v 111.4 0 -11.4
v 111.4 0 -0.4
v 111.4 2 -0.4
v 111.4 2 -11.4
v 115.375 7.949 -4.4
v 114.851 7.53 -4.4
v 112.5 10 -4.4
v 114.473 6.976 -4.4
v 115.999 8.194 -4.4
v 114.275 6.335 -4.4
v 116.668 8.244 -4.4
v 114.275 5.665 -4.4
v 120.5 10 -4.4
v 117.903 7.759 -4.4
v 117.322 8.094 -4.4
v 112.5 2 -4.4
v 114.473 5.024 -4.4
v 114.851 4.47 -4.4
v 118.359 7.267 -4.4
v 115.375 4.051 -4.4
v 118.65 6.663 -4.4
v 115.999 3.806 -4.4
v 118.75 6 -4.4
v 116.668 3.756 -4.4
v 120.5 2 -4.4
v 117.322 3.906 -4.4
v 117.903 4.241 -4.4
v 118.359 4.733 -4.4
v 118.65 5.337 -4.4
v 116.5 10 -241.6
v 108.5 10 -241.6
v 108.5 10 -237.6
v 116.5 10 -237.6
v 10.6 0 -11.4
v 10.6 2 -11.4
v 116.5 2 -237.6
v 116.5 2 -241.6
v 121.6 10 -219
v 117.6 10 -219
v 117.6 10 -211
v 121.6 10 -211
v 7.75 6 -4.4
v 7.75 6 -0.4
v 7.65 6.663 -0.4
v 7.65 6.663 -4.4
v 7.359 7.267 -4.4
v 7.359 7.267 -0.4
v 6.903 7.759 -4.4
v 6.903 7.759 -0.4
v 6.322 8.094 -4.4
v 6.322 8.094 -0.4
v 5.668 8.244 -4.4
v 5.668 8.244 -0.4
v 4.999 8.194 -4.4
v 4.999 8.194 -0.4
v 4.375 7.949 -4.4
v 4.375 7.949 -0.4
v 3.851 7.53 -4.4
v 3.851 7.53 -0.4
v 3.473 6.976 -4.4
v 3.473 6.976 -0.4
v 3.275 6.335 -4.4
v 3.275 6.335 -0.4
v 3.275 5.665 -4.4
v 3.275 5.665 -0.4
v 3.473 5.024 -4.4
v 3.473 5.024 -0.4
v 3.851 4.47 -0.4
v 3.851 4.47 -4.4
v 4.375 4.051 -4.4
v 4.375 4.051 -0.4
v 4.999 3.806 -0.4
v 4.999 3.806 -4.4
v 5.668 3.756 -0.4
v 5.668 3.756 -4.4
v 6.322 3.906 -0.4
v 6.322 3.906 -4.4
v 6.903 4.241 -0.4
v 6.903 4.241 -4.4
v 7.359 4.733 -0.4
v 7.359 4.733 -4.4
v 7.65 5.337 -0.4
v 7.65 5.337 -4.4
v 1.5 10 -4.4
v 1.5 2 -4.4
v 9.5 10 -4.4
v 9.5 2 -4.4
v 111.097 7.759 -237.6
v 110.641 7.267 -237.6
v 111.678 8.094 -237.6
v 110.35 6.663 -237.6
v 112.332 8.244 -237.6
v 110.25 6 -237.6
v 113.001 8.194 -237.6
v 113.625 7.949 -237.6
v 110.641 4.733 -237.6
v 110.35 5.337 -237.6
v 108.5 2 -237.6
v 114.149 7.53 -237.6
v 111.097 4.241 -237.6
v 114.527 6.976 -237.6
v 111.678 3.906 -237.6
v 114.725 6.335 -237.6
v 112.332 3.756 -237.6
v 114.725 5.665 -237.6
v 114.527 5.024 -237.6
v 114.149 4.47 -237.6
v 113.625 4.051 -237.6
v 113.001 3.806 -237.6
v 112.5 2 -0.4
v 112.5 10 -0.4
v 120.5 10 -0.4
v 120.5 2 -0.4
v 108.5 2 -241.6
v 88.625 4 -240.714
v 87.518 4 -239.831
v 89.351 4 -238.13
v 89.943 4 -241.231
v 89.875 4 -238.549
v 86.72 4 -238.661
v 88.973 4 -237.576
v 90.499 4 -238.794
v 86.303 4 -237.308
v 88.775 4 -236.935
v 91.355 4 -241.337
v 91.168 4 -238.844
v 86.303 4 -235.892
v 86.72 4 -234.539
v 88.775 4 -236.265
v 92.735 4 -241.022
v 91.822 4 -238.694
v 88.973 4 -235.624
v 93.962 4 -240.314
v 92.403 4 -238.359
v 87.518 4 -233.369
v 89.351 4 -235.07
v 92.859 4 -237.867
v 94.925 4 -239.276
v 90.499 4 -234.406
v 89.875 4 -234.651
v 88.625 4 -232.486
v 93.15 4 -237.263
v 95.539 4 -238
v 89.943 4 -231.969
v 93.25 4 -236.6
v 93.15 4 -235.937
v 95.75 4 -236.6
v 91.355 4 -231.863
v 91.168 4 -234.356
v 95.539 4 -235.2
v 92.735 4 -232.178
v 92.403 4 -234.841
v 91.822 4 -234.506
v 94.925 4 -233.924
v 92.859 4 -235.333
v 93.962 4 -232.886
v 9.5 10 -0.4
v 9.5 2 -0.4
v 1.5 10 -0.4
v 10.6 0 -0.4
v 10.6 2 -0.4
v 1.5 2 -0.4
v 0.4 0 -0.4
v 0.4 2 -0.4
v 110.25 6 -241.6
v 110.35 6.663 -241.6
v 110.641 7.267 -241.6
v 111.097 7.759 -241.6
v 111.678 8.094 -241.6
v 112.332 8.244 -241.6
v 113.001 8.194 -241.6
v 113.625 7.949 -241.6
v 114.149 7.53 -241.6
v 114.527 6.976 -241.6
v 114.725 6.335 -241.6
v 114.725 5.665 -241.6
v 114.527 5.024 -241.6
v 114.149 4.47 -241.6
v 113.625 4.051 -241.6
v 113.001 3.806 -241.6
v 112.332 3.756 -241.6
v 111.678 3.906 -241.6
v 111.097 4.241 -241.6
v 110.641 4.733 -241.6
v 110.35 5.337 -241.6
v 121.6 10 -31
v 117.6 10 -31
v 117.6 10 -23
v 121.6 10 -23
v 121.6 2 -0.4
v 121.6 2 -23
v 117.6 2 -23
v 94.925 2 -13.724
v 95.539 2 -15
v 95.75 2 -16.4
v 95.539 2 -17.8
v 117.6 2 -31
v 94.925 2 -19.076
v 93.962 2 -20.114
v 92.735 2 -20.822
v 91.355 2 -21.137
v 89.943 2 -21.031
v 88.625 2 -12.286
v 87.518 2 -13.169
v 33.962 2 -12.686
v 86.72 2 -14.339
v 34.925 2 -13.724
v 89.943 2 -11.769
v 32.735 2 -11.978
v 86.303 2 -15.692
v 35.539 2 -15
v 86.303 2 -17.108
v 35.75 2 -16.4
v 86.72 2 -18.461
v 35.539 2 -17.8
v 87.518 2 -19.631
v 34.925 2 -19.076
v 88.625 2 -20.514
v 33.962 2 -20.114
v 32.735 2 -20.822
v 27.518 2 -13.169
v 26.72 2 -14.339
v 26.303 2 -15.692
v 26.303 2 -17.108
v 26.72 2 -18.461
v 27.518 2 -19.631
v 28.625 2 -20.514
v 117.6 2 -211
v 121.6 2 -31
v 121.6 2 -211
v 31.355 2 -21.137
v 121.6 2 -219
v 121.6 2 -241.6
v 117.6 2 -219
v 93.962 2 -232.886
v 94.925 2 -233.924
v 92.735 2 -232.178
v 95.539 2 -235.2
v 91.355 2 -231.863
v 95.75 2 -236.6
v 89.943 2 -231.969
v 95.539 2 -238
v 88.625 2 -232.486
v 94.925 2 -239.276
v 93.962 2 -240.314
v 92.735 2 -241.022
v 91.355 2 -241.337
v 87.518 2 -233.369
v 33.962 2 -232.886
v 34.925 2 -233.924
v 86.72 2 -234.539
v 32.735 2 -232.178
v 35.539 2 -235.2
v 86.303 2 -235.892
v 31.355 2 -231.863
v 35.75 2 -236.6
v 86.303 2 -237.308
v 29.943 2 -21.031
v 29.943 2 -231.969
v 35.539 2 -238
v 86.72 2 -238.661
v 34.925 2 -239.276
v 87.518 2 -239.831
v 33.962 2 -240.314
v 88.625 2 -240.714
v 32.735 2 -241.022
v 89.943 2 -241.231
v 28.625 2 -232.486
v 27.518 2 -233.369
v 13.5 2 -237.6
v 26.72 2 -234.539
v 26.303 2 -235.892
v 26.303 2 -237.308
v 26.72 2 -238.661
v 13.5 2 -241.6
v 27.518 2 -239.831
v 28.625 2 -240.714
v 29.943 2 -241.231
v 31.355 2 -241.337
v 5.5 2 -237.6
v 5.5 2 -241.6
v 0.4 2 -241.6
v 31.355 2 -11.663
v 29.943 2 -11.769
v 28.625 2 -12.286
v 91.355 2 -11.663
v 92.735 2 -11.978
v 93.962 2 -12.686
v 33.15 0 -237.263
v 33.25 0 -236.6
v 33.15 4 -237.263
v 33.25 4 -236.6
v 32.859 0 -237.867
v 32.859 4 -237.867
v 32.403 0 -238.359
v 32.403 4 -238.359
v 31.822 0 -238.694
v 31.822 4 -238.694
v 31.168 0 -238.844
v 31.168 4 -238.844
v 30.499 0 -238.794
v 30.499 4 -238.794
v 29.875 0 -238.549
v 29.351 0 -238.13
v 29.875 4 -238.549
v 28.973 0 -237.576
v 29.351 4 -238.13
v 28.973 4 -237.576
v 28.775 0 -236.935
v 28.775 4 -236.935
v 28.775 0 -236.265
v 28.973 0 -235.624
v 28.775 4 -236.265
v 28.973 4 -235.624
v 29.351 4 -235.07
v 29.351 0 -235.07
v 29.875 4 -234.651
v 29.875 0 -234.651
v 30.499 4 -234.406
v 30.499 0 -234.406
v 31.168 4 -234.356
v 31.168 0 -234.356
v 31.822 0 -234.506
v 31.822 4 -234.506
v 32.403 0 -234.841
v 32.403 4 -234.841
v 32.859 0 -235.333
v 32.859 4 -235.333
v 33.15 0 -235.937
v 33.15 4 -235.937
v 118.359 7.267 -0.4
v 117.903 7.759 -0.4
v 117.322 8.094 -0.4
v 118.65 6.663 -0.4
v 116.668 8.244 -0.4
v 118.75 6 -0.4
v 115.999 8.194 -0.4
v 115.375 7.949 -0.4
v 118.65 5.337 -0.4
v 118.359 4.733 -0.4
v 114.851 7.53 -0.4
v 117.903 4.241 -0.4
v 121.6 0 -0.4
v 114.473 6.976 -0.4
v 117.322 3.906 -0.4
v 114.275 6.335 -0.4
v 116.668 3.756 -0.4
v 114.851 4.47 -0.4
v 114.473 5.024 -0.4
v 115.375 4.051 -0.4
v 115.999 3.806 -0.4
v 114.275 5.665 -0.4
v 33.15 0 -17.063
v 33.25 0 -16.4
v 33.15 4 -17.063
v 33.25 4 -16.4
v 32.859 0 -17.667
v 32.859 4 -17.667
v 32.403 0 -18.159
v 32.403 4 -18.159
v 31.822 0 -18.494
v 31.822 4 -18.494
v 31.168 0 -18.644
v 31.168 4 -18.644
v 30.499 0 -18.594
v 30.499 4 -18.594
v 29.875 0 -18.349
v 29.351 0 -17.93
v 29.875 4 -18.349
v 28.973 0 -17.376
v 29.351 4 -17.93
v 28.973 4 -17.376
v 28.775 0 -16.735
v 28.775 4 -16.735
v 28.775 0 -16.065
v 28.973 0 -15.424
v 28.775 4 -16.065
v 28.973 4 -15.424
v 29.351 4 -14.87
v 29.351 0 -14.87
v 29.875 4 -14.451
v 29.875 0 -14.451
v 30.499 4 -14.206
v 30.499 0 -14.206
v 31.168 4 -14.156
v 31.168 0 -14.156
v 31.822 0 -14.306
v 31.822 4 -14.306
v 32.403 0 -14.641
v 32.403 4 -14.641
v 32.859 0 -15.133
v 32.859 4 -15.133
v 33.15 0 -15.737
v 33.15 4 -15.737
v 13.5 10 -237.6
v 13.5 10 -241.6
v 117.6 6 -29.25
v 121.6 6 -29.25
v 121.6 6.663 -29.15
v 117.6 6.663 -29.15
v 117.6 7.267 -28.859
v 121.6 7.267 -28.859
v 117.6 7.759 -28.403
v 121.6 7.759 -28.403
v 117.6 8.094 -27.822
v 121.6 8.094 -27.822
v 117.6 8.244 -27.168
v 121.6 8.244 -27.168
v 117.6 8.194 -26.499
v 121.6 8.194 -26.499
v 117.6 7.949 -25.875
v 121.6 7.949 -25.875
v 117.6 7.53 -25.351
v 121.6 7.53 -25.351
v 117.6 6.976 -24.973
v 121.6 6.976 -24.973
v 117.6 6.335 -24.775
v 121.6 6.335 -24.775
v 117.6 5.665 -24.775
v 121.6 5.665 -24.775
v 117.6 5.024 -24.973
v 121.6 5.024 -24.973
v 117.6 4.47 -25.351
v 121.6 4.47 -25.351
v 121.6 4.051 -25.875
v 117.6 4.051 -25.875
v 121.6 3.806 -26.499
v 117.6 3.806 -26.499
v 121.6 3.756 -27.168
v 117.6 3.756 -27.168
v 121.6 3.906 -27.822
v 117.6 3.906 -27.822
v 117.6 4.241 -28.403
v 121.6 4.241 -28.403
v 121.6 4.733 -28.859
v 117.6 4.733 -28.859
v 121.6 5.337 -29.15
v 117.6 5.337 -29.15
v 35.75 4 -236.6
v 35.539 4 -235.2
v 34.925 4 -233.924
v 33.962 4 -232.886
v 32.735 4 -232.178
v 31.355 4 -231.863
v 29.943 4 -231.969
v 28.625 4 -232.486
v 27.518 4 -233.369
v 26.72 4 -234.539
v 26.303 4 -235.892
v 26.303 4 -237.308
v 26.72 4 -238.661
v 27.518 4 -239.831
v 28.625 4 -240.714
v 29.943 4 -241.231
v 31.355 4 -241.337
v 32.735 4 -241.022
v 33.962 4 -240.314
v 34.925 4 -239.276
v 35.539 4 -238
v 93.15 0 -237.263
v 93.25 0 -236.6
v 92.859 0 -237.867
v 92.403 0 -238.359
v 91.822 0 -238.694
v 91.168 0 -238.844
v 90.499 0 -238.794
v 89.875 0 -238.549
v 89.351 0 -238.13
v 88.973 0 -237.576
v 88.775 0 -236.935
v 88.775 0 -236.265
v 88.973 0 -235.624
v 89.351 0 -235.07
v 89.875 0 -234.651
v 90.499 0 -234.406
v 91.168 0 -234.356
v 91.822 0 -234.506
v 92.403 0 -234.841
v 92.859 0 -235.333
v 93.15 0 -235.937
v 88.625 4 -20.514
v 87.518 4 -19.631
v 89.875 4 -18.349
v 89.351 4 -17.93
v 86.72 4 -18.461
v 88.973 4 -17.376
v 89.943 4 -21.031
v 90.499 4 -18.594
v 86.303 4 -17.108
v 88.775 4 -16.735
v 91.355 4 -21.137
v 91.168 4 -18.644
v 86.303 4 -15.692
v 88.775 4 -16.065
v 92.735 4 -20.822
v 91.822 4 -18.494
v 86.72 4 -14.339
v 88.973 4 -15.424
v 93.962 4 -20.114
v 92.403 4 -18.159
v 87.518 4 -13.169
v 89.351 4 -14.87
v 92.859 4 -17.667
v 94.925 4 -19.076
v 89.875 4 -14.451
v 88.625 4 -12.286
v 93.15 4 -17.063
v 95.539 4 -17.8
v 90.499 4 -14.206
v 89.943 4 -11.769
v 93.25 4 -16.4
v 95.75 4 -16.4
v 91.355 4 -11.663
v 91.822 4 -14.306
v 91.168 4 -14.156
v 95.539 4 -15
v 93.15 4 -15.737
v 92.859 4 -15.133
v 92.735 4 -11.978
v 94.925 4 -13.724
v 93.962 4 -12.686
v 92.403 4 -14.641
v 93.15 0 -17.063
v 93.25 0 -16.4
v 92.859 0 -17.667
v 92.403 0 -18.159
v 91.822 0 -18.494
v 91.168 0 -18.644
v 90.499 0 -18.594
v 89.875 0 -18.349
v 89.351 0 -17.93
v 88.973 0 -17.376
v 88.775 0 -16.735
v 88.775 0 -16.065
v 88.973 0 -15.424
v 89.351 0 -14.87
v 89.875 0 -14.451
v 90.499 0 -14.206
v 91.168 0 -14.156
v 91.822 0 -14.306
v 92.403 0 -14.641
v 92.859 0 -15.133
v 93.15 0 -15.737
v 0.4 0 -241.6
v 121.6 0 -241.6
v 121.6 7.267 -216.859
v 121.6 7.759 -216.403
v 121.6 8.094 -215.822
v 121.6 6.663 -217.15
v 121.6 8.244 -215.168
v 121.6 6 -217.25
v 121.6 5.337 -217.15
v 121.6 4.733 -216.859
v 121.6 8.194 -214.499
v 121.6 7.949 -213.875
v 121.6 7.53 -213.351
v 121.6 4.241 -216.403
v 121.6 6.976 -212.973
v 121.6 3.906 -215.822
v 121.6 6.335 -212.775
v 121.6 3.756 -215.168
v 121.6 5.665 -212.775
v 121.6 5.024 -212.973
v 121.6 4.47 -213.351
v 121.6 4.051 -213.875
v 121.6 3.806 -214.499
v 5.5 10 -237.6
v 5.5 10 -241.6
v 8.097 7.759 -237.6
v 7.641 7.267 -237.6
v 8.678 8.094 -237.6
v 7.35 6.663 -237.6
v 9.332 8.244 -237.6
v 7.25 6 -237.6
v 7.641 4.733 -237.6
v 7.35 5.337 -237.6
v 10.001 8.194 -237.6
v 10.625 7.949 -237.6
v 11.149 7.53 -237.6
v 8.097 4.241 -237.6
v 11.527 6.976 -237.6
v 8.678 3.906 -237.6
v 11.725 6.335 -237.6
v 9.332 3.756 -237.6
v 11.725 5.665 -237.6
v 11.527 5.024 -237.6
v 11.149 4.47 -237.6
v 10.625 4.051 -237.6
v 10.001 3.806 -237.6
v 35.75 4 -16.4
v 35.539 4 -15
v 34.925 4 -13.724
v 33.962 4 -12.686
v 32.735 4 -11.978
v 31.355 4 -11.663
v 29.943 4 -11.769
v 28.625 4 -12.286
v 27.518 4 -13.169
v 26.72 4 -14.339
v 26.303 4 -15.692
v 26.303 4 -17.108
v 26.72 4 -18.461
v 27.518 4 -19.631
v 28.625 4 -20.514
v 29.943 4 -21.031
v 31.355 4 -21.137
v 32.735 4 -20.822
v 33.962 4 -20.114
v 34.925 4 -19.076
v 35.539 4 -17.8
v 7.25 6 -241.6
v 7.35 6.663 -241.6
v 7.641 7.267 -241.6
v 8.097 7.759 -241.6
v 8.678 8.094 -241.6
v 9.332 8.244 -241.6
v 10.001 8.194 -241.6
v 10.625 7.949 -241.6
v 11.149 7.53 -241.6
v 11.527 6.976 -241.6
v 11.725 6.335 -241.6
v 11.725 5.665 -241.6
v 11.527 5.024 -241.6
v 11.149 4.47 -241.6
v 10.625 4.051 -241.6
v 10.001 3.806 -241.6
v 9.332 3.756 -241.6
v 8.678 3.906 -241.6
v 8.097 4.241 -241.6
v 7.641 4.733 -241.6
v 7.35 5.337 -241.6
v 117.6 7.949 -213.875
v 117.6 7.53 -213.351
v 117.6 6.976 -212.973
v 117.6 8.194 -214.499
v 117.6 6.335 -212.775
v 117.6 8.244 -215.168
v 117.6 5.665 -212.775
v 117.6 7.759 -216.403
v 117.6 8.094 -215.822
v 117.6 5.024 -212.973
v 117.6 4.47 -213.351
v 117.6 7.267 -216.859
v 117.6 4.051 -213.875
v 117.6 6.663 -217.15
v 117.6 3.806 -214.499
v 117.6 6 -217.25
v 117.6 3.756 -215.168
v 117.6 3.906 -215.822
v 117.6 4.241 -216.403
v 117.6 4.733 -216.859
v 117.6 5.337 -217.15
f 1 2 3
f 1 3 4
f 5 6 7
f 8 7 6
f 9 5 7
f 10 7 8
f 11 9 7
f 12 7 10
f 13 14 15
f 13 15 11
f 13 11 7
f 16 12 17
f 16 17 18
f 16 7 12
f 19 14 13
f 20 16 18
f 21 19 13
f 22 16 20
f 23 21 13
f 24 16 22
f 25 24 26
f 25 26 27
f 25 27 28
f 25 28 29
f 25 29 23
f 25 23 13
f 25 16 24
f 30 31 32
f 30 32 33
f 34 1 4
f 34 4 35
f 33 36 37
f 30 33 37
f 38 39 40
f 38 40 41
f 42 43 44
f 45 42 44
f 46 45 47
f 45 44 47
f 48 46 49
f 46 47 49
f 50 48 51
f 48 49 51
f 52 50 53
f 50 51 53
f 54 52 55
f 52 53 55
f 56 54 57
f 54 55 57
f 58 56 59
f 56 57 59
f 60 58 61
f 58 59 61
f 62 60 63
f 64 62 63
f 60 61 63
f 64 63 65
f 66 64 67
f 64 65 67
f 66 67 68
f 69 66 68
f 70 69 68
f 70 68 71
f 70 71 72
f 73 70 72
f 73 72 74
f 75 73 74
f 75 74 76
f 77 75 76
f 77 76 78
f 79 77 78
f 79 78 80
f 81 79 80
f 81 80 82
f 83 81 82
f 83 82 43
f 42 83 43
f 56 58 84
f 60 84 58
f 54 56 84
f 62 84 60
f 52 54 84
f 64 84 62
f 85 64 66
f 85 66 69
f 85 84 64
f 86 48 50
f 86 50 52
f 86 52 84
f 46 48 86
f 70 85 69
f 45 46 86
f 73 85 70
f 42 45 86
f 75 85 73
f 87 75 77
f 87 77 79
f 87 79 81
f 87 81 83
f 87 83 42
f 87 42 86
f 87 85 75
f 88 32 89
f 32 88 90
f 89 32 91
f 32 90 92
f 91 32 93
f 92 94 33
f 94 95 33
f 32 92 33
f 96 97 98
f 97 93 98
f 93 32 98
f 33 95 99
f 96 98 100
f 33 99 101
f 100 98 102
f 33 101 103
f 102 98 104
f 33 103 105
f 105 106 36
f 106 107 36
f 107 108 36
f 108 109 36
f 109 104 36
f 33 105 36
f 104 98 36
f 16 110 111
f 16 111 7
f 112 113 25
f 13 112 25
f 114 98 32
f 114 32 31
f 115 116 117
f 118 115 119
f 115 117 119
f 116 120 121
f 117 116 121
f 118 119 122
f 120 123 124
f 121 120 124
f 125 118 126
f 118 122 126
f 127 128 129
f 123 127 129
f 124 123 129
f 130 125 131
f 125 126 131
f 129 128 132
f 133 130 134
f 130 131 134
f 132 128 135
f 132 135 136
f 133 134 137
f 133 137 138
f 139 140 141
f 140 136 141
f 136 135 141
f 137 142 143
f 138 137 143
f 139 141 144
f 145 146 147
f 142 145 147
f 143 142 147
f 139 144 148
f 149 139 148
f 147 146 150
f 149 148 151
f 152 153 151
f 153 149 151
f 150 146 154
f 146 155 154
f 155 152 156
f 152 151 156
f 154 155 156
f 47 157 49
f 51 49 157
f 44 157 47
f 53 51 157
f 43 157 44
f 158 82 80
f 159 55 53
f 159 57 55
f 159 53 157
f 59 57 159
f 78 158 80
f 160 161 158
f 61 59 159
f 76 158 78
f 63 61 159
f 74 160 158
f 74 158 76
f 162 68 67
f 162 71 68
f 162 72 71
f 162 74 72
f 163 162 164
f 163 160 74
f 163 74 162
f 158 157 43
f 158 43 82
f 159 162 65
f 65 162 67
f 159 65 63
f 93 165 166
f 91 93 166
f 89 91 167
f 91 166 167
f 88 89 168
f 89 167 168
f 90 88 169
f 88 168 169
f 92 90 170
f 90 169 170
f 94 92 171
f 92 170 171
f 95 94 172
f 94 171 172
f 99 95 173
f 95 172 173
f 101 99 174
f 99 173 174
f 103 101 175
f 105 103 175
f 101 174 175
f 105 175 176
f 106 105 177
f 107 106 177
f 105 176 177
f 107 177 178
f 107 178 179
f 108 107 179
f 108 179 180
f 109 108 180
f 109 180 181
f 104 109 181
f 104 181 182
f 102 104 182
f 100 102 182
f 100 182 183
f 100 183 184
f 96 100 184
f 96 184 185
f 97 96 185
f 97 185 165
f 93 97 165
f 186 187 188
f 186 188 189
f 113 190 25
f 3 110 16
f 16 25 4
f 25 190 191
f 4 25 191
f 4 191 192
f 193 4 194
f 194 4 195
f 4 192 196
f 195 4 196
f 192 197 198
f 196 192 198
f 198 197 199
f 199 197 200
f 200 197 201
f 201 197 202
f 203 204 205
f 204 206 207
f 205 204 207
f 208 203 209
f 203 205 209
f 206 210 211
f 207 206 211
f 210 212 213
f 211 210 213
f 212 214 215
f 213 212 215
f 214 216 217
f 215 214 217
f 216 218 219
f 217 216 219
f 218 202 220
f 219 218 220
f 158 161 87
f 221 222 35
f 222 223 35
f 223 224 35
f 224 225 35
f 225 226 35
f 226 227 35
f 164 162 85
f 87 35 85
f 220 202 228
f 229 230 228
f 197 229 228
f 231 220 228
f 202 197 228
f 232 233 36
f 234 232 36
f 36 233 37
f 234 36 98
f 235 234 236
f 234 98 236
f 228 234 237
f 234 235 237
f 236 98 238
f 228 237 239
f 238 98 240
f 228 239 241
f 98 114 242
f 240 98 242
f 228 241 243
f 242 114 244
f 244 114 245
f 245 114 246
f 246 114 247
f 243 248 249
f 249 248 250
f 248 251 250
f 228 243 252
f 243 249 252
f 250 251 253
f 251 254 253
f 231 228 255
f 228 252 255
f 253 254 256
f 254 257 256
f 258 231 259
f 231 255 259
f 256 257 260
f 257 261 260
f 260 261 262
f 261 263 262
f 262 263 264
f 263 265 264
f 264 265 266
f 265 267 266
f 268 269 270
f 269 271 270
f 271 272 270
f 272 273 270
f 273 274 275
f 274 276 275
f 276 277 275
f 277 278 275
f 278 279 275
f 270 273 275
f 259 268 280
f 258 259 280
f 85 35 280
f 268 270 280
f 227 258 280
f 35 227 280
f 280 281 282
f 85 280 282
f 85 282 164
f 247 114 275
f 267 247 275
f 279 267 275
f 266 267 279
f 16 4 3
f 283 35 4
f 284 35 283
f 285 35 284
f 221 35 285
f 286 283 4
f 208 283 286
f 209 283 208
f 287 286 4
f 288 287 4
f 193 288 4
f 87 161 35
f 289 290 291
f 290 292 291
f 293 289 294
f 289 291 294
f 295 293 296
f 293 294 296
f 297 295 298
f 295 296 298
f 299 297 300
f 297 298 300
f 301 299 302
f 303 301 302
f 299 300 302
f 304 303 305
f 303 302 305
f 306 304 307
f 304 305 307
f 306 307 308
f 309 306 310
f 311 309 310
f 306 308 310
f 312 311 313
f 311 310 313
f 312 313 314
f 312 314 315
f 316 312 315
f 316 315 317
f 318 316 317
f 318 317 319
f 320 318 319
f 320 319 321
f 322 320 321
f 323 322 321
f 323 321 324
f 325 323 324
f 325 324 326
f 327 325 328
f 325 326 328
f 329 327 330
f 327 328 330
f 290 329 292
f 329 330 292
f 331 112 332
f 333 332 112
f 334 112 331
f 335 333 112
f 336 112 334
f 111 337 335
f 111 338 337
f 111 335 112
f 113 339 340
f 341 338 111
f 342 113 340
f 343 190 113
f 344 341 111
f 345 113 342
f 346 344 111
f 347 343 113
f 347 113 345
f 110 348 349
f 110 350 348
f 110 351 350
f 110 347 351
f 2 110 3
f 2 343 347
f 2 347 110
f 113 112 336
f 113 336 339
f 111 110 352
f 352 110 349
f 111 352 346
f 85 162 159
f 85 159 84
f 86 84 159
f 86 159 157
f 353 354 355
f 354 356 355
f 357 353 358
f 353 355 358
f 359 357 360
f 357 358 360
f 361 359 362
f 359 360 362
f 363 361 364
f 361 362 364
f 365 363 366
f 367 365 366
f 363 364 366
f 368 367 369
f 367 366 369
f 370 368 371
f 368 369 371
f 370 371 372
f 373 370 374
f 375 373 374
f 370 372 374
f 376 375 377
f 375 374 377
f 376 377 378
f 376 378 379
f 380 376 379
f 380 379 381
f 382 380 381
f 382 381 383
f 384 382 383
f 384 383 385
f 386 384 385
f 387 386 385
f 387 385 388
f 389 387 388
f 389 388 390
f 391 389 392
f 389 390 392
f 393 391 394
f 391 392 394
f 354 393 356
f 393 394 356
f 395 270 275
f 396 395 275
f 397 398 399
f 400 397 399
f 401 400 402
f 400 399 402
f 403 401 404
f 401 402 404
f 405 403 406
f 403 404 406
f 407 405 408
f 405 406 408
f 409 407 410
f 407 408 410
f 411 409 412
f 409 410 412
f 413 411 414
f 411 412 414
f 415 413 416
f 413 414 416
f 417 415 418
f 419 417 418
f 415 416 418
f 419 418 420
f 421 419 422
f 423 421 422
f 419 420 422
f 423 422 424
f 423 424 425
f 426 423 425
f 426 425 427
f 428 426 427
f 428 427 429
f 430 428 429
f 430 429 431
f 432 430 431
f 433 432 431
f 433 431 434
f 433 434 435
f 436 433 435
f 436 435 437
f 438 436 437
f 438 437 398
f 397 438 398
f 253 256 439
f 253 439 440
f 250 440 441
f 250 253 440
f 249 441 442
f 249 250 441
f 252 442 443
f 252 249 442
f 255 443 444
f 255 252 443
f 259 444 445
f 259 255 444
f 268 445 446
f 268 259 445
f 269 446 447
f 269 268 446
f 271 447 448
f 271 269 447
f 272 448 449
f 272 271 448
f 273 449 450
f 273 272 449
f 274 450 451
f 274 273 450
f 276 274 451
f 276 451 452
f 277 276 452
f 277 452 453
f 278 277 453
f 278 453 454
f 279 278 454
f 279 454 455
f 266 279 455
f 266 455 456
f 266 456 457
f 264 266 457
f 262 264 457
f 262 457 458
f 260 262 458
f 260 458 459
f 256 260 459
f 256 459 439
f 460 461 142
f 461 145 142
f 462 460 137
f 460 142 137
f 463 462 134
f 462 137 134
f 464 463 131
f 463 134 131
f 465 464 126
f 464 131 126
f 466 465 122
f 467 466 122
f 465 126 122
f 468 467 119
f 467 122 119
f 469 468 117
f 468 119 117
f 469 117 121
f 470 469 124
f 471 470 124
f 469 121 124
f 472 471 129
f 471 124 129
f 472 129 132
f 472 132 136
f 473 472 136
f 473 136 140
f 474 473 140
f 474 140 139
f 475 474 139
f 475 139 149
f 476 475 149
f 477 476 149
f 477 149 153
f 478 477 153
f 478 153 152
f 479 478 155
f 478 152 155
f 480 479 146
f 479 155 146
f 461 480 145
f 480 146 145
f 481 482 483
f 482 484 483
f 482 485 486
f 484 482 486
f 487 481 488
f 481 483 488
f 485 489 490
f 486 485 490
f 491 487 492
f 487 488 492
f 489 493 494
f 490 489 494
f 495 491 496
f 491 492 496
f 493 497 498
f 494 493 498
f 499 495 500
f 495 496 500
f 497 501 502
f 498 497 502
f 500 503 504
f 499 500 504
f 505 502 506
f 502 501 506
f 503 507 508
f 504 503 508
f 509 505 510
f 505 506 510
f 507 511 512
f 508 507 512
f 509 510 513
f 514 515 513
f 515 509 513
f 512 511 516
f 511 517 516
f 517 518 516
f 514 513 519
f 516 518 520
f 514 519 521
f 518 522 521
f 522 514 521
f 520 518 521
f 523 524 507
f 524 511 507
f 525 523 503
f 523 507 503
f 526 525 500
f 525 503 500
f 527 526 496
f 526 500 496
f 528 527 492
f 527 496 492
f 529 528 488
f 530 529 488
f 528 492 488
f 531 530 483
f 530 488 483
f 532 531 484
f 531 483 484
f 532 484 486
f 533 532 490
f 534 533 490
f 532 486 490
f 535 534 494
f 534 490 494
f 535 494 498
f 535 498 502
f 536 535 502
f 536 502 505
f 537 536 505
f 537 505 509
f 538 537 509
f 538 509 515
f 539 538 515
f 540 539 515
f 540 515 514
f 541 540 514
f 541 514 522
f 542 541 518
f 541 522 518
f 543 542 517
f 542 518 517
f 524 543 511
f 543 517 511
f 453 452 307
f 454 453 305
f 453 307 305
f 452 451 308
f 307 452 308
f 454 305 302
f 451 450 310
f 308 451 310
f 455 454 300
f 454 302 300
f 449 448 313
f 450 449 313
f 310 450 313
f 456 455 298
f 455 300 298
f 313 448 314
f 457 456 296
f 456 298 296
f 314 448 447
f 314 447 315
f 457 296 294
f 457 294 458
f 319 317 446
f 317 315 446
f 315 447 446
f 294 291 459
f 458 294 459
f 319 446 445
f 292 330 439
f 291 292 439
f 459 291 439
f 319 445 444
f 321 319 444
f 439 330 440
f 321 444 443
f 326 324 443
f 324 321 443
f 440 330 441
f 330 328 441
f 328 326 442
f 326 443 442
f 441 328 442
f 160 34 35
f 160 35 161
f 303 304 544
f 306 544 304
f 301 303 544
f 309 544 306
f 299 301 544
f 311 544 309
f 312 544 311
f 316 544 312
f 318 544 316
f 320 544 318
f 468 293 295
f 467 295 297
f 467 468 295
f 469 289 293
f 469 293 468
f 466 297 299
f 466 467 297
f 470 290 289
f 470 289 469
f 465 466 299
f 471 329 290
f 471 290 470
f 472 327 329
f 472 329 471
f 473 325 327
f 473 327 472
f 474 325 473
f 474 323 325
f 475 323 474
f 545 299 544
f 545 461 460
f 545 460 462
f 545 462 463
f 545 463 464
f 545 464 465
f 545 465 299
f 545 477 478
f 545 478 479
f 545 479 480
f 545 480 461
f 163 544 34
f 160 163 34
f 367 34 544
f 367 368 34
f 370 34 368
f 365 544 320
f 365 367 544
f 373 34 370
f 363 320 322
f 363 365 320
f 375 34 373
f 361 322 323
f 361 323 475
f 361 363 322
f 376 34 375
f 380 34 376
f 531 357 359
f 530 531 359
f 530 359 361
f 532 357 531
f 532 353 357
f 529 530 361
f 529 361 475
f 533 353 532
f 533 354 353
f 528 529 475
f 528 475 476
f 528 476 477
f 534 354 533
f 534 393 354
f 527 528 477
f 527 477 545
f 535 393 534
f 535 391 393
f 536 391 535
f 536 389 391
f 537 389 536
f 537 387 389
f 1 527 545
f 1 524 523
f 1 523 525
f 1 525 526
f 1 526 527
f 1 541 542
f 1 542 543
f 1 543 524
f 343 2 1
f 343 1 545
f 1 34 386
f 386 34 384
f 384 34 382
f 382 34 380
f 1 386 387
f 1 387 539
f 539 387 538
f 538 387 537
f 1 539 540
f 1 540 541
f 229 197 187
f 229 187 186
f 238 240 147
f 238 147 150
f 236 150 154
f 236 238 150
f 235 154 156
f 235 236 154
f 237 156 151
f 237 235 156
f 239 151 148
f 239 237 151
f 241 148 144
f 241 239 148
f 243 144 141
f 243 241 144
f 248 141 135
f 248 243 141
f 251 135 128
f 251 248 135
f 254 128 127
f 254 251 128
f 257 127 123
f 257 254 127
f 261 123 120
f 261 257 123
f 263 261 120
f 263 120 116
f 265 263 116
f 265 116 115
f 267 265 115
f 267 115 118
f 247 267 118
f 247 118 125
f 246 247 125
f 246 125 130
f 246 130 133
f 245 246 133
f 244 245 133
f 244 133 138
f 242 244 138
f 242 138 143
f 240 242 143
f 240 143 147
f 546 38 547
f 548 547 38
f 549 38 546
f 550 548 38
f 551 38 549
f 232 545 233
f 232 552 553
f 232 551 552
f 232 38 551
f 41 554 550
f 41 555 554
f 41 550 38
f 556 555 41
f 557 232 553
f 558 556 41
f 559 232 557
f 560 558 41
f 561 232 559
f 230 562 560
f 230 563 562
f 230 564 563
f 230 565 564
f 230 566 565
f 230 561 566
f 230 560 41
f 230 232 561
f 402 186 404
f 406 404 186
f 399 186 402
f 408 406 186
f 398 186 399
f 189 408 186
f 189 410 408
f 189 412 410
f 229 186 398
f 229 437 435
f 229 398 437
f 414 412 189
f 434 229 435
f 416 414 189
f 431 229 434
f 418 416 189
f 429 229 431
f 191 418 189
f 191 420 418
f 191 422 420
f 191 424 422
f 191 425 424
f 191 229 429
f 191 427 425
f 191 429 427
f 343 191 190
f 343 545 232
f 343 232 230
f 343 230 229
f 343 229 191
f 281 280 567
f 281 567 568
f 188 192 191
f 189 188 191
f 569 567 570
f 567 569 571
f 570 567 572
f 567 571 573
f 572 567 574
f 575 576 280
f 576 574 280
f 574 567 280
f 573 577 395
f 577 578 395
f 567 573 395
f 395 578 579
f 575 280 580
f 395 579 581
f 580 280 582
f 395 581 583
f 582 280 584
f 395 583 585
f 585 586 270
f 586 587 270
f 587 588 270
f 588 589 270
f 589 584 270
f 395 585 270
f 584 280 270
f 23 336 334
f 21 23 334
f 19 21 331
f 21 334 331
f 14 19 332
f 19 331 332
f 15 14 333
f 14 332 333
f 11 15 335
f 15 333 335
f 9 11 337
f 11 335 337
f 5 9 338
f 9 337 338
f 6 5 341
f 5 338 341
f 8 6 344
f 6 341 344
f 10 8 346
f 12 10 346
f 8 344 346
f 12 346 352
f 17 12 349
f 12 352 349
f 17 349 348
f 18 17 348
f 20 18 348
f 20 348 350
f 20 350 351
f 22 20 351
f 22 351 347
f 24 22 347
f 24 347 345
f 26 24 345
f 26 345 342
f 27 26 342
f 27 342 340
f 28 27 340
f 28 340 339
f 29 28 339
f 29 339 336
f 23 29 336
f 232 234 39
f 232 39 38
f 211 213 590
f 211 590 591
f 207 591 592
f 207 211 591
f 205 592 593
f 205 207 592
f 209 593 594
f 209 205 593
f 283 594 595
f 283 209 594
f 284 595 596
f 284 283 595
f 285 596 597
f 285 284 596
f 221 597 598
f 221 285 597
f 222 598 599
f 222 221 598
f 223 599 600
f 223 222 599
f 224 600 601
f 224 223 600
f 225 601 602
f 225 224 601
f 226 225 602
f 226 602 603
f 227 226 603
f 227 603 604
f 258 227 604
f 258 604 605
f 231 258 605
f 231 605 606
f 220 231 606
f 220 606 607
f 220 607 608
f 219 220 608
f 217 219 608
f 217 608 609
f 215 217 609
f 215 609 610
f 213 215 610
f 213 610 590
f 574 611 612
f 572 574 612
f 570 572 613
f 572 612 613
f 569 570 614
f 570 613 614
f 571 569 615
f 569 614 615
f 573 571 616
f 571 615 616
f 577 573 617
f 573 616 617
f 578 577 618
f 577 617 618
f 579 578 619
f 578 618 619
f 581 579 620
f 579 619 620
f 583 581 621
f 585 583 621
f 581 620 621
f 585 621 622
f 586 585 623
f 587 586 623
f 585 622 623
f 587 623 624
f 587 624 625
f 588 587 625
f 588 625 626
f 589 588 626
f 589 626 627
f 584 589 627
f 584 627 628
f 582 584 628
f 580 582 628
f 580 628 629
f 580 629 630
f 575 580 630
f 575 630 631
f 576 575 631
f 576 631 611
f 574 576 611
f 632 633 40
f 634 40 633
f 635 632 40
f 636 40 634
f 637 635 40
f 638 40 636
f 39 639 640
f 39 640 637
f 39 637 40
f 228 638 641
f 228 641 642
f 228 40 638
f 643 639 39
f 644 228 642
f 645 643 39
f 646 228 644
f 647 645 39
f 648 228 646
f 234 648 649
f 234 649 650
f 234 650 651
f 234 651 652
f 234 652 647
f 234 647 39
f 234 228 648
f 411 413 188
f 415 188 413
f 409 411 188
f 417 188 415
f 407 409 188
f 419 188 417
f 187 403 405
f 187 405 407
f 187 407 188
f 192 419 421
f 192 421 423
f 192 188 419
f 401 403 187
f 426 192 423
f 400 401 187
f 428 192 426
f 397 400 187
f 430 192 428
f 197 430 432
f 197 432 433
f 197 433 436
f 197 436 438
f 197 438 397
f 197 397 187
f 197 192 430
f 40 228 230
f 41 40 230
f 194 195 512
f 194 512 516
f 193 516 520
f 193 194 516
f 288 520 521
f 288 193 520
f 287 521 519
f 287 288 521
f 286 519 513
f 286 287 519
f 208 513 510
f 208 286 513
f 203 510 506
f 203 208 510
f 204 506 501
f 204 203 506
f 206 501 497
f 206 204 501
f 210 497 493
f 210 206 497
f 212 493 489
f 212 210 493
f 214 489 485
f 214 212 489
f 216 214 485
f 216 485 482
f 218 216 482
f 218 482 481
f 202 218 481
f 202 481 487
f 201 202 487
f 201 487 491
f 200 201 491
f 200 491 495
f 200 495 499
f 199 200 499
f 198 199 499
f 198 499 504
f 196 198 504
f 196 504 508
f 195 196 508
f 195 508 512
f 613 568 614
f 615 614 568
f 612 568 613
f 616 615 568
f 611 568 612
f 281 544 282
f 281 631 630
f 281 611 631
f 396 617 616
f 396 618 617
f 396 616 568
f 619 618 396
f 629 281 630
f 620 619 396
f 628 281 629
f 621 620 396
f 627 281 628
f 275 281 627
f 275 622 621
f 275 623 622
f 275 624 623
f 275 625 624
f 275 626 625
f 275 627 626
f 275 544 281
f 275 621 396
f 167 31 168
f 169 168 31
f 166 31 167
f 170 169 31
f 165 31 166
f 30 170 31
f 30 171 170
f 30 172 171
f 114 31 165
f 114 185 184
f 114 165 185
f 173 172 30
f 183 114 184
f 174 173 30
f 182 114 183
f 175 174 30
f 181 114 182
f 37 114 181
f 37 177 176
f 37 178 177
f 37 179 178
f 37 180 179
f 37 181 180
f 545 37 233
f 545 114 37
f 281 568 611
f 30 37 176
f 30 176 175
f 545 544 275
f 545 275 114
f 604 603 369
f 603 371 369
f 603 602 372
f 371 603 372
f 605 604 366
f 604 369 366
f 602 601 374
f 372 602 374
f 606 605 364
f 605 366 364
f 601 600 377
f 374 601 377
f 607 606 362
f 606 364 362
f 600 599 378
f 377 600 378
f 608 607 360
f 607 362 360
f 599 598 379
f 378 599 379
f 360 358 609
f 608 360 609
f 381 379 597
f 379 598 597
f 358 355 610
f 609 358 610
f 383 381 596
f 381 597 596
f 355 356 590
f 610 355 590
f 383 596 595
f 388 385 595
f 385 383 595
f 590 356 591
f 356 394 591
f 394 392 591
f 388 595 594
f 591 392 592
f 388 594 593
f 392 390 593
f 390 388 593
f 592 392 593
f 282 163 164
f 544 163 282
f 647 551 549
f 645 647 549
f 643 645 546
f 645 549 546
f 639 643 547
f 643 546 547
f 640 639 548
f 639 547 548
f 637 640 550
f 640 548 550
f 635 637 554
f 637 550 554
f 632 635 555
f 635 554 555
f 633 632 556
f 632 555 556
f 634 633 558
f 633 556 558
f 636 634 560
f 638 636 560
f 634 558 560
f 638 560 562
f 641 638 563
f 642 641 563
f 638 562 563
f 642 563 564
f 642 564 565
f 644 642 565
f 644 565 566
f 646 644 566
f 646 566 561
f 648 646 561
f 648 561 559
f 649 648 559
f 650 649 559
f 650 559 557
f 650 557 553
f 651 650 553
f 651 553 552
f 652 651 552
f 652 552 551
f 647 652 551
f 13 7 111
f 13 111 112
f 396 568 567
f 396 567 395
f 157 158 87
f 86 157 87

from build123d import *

# Parameters (mm, degrees)
BOSS_EXTRUDE1_DEPTH = 2
SKETCH2_W           = 8
SKETCH2_H           = 4
SKETCH2_W_2         = 4
SKETCH2_H_2         = 8
BOSS_EXTRUDE2_DEPTH = 8
CUT_EXTRUDE1_REACH  = 243.2
SKETCH3_R           = 2.25
CUT_EXTRUDE3_REACH  = 243.2
SKETCH5_R           = 2.25
CUT_EXTRUDE4_REACH  = 123.2
SKETCH6_R           = 2.25
SKETCH7_R           = 4.75
SKETCH7_R_2         = 2.25
BOSS_EXTRUDE3_DEPTH = 4
CUT_EXTRUDE5_REACH  = 6
SKETCH8_R           = 2.25


with BuildPart() as part:
    # Sketch1 → Boss-Extrude1 (new body)
    with BuildSketch(Plane(origin=(0, 0, 0), x_dir=(1, 0, 0), z_dir=(0, 1, 0))):
        Polygon((0.4, 241.6), (121.6, 241.6), (121.6, 0.4), (111.4, 0.4), (111.4, 11.4), (10.6, 11.4), (10.6, 0.4), (0.4, 0.4), align=None)
    extrude(amount=BOSS_EXTRUDE1_DEPTH)

    # Sketch2 → Boss-Extrude2 (add)
    with BuildSketch(Plane(origin=(0, 2, 0), x_dir=(1, 0, 0), z_dir=(0, 1, 0))):
        with Locations((9.5, 239.6)):
            Rectangle(SKETCH2_W, SKETCH2_H)
        with Locations((112.5, 239.6)):
            Rectangle(SKETCH2_W, SKETCH2_H)
        with Locations((5.5, 2.4)):
            Rectangle(SKETCH2_W, SKETCH2_H)
        with Locations((116.5, 2.4)):
            Rectangle(SKETCH2_W, SKETCH2_H)
        with Locations((119.6, 27)):
            Rectangle(SKETCH2_W_2, SKETCH2_H_2)
        with Locations((119.6, 215)):
            Rectangle(SKETCH2_W_2, SKETCH2_H_2)
    extrude(amount=BOSS_EXTRUDE2_DEPTH)

    # Sketch3 → Cut-Extrude1 (cut, up to next)
    with BuildSketch(Plane.XY.offset(-0.4), mode=Mode.PRIVATE) as cut_extrude1_sk1:
        with Locations((5.5, 6)):
            Circle(SKETCH3_R)
    cut_extrude1_tool1 = extrude(cut_extrude1_sk1.sketch, amount=-CUT_EXTRUDE1_REACH, mode=Mode.PRIVATE) & part.part
    add(cut_extrude1_tool1.solids().sort_by_distance((5.5, 6, -0.4))[0], mode=Mode.SUBTRACT)
    # Sketch3 → Cut-Extrude1 (cut, up to next)
    with BuildSketch(Plane.XY.offset(-0.4), mode=Mode.PRIVATE) as cut_extrude1_sk2:
        with Locations((116.5, 6)):
            Circle(SKETCH3_R)
    cut_extrude1_tool2 = extrude(cut_extrude1_sk2.sketch, amount=-CUT_EXTRUDE1_REACH, mode=Mode.PRIVATE) & part.part
    add(cut_extrude1_tool2.solids().sort_by_distance((116.5, 6, -0.4))[0], mode=Mode.SUBTRACT)

    # Sketch5 → Cut-Extrude3 (cut, up to next)
    with BuildSketch(Plane(origin=(0, 0, -241.6), x_dir=(-1, 0, 0), z_dir=(0, 0, -1)), mode=Mode.PRIVATE) as cut_extrude3_sk1:
        with Locations((-112.5, 6)):
            Circle(SKETCH5_R)
    cut_extrude3_tool1 = extrude(cut_extrude3_sk1.sketch, amount=-CUT_EXTRUDE3_REACH, mode=Mode.PRIVATE) & part.part
    add(cut_extrude3_tool1.solids().sort_by_distance((112.5, 6, -241.6))[0], mode=Mode.SUBTRACT)
    # Sketch5 → Cut-Extrude3 (cut, up to next)
    with BuildSketch(Plane(origin=(0, 0, -241.6), x_dir=(-1, 0, 0), z_dir=(0, 0, -1)), mode=Mode.PRIVATE) as cut_extrude3_sk2:
        with Locations((-9.5, 6)):
            Circle(SKETCH5_R)
    cut_extrude3_tool2 = extrude(cut_extrude3_sk2.sketch, amount=-CUT_EXTRUDE3_REACH, mode=Mode.PRIVATE) & part.part
    add(cut_extrude3_tool2.solids().sort_by_distance((9.5, 6, -241.6))[0], mode=Mode.SUBTRACT)

    # Sketch6 → Cut-Extrude4 (cut, up to next)
    with BuildSketch(Plane(origin=(121.6, 0, 0), x_dir=(0, 0, -1), z_dir=(1, 0, 0)), mode=Mode.PRIVATE) as cut_extrude4_sk1:
        with Locations((27, 6)):
            Circle(SKETCH6_R)
    cut_extrude4_tool1 = extrude(cut_extrude4_sk1.sketch, amount=-CUT_EXTRUDE4_REACH, mode=Mode.PRIVATE) & part.part
    add(cut_extrude4_tool1.solids().sort_by_distance((121.6, 6, -27))[0], mode=Mode.SUBTRACT)
    # Sketch6 → Cut-Extrude4 (cut, up to next)
    with BuildSketch(Plane(origin=(121.6, 0, 0), x_dir=(0, 0, -1), z_dir=(1, 0, 0)), mode=Mode.PRIVATE) as cut_extrude4_sk2:
        with Locations((215, 6)):
            Circle(SKETCH6_R)
    cut_extrude4_tool2 = extrude(cut_extrude4_sk2.sketch, amount=-CUT_EXTRUDE4_REACH, mode=Mode.PRIVATE) & part.part
    add(cut_extrude4_tool2.solids().sort_by_distance((121.6, 6, -215))[0], mode=Mode.SUBTRACT)

    # Sketch7 → Boss-Extrude3 (add)
    with BuildSketch(Plane.XZ):
        with Locations((31, -236.6)):
            Circle(SKETCH7_R)
        with Locations((31, -236.6)):
            Circle(SKETCH7_R_2, mode=Mode.SUBTRACT)
        with Locations((31, -16.4)):
            Circle(SKETCH7_R)
        with Locations((31, -16.4)):
            Circle(SKETCH7_R_2, mode=Mode.SUBTRACT)
        with Locations((91, -236.6)):
            Circle(SKETCH7_R)
        with Locations((91, -236.6)):
            Circle(SKETCH7_R_2, mode=Mode.SUBTRACT)
        with Locations((91, -16.4)):
            Circle(SKETCH7_R)
        with Locations((91, -16.4)):
            Circle(SKETCH7_R_2, mode=Mode.SUBTRACT)
    extrude(amount=-BOSS_EXTRUDE3_DEPTH)

    # Sketch8 → Cut-Extrude5 (cut, up to next)
    with BuildSketch(Plane(origin=(0, 4, 0), x_dir=(1, 0, 0), z_dir=(0, 1, 0)), mode=Mode.PRIVATE) as cut_extrude5_sk1:
        with Locations((31, 16.4)):
            Circle(SKETCH8_R)
    cut_extrude5_tool1 = extrude(cut_extrude5_sk1.sketch, amount=-CUT_EXTRUDE5_REACH, mode=Mode.PRIVATE) & part.part
    add(cut_extrude5_tool1.solids().sort_by_distance((31, 4, -16.4))[0], mode=Mode.SUBTRACT)
    # Sketch8 → Cut-Extrude5 (cut, up to next)
    with BuildSketch(Plane(origin=(0, 4, 0), x_dir=(1, 0, 0), z_dir=(0, 1, 0)), mode=Mode.PRIVATE) as cut_extrude5_sk2:
        with Locations((91, 16.4)):
            Circle(SKETCH8_R)
    cut_extrude5_tool2 = extrude(cut_extrude5_sk2.sketch, amount=-CUT_EXTRUDE5_REACH, mode=Mode.PRIVATE) & part.part
    add(cut_extrude5_tool2.solids().sort_by_distance((91, 4, -16.4))[0], mode=Mode.SUBTRACT)
    # Sketch8 → Cut-Extrude5 (cut, up to next)
    with BuildSketch(Plane(origin=(0, 4, 0), x_dir=(1, 0, 0), z_dir=(0, 1, 0)), mode=Mode.PRIVATE) as cut_extrude5_sk3:
        with Locations((31, 236.6)):
            Circle(SKETCH8_R)
    cut_extrude5_tool3 = extrude(cut_extrude5_sk3.sketch, amount=-CUT_EXTRUDE5_REACH, mode=Mode.PRIVATE) & part.part
    add(cut_extrude5_tool3.solids().sort_by_distance((31, 4, -236.6))[0], mode=Mode.SUBTRACT)
    # Sketch8 → Cut-Extrude5 (cut, up to next)
    with BuildSketch(Plane(origin=(0, 4, 0), x_dir=(1, 0, 0), z_dir=(0, 1, 0)), mode=Mode.PRIVATE) as cut_extrude5_sk4:
        with Locations((91, 236.6)):
            Circle(SKETCH8_R)
    cut_extrude5_tool4 = extrude(cut_extrude5_sk4.sketch, amount=-CUT_EXTRUDE5_REACH, mode=Mode.PRIVATE) & part.part
    add(cut_extrude5_tool4.solids().sort_by_distance((91, 4, -236.6))[0], mode=Mode.SUBTRACT)


solid = part.part
